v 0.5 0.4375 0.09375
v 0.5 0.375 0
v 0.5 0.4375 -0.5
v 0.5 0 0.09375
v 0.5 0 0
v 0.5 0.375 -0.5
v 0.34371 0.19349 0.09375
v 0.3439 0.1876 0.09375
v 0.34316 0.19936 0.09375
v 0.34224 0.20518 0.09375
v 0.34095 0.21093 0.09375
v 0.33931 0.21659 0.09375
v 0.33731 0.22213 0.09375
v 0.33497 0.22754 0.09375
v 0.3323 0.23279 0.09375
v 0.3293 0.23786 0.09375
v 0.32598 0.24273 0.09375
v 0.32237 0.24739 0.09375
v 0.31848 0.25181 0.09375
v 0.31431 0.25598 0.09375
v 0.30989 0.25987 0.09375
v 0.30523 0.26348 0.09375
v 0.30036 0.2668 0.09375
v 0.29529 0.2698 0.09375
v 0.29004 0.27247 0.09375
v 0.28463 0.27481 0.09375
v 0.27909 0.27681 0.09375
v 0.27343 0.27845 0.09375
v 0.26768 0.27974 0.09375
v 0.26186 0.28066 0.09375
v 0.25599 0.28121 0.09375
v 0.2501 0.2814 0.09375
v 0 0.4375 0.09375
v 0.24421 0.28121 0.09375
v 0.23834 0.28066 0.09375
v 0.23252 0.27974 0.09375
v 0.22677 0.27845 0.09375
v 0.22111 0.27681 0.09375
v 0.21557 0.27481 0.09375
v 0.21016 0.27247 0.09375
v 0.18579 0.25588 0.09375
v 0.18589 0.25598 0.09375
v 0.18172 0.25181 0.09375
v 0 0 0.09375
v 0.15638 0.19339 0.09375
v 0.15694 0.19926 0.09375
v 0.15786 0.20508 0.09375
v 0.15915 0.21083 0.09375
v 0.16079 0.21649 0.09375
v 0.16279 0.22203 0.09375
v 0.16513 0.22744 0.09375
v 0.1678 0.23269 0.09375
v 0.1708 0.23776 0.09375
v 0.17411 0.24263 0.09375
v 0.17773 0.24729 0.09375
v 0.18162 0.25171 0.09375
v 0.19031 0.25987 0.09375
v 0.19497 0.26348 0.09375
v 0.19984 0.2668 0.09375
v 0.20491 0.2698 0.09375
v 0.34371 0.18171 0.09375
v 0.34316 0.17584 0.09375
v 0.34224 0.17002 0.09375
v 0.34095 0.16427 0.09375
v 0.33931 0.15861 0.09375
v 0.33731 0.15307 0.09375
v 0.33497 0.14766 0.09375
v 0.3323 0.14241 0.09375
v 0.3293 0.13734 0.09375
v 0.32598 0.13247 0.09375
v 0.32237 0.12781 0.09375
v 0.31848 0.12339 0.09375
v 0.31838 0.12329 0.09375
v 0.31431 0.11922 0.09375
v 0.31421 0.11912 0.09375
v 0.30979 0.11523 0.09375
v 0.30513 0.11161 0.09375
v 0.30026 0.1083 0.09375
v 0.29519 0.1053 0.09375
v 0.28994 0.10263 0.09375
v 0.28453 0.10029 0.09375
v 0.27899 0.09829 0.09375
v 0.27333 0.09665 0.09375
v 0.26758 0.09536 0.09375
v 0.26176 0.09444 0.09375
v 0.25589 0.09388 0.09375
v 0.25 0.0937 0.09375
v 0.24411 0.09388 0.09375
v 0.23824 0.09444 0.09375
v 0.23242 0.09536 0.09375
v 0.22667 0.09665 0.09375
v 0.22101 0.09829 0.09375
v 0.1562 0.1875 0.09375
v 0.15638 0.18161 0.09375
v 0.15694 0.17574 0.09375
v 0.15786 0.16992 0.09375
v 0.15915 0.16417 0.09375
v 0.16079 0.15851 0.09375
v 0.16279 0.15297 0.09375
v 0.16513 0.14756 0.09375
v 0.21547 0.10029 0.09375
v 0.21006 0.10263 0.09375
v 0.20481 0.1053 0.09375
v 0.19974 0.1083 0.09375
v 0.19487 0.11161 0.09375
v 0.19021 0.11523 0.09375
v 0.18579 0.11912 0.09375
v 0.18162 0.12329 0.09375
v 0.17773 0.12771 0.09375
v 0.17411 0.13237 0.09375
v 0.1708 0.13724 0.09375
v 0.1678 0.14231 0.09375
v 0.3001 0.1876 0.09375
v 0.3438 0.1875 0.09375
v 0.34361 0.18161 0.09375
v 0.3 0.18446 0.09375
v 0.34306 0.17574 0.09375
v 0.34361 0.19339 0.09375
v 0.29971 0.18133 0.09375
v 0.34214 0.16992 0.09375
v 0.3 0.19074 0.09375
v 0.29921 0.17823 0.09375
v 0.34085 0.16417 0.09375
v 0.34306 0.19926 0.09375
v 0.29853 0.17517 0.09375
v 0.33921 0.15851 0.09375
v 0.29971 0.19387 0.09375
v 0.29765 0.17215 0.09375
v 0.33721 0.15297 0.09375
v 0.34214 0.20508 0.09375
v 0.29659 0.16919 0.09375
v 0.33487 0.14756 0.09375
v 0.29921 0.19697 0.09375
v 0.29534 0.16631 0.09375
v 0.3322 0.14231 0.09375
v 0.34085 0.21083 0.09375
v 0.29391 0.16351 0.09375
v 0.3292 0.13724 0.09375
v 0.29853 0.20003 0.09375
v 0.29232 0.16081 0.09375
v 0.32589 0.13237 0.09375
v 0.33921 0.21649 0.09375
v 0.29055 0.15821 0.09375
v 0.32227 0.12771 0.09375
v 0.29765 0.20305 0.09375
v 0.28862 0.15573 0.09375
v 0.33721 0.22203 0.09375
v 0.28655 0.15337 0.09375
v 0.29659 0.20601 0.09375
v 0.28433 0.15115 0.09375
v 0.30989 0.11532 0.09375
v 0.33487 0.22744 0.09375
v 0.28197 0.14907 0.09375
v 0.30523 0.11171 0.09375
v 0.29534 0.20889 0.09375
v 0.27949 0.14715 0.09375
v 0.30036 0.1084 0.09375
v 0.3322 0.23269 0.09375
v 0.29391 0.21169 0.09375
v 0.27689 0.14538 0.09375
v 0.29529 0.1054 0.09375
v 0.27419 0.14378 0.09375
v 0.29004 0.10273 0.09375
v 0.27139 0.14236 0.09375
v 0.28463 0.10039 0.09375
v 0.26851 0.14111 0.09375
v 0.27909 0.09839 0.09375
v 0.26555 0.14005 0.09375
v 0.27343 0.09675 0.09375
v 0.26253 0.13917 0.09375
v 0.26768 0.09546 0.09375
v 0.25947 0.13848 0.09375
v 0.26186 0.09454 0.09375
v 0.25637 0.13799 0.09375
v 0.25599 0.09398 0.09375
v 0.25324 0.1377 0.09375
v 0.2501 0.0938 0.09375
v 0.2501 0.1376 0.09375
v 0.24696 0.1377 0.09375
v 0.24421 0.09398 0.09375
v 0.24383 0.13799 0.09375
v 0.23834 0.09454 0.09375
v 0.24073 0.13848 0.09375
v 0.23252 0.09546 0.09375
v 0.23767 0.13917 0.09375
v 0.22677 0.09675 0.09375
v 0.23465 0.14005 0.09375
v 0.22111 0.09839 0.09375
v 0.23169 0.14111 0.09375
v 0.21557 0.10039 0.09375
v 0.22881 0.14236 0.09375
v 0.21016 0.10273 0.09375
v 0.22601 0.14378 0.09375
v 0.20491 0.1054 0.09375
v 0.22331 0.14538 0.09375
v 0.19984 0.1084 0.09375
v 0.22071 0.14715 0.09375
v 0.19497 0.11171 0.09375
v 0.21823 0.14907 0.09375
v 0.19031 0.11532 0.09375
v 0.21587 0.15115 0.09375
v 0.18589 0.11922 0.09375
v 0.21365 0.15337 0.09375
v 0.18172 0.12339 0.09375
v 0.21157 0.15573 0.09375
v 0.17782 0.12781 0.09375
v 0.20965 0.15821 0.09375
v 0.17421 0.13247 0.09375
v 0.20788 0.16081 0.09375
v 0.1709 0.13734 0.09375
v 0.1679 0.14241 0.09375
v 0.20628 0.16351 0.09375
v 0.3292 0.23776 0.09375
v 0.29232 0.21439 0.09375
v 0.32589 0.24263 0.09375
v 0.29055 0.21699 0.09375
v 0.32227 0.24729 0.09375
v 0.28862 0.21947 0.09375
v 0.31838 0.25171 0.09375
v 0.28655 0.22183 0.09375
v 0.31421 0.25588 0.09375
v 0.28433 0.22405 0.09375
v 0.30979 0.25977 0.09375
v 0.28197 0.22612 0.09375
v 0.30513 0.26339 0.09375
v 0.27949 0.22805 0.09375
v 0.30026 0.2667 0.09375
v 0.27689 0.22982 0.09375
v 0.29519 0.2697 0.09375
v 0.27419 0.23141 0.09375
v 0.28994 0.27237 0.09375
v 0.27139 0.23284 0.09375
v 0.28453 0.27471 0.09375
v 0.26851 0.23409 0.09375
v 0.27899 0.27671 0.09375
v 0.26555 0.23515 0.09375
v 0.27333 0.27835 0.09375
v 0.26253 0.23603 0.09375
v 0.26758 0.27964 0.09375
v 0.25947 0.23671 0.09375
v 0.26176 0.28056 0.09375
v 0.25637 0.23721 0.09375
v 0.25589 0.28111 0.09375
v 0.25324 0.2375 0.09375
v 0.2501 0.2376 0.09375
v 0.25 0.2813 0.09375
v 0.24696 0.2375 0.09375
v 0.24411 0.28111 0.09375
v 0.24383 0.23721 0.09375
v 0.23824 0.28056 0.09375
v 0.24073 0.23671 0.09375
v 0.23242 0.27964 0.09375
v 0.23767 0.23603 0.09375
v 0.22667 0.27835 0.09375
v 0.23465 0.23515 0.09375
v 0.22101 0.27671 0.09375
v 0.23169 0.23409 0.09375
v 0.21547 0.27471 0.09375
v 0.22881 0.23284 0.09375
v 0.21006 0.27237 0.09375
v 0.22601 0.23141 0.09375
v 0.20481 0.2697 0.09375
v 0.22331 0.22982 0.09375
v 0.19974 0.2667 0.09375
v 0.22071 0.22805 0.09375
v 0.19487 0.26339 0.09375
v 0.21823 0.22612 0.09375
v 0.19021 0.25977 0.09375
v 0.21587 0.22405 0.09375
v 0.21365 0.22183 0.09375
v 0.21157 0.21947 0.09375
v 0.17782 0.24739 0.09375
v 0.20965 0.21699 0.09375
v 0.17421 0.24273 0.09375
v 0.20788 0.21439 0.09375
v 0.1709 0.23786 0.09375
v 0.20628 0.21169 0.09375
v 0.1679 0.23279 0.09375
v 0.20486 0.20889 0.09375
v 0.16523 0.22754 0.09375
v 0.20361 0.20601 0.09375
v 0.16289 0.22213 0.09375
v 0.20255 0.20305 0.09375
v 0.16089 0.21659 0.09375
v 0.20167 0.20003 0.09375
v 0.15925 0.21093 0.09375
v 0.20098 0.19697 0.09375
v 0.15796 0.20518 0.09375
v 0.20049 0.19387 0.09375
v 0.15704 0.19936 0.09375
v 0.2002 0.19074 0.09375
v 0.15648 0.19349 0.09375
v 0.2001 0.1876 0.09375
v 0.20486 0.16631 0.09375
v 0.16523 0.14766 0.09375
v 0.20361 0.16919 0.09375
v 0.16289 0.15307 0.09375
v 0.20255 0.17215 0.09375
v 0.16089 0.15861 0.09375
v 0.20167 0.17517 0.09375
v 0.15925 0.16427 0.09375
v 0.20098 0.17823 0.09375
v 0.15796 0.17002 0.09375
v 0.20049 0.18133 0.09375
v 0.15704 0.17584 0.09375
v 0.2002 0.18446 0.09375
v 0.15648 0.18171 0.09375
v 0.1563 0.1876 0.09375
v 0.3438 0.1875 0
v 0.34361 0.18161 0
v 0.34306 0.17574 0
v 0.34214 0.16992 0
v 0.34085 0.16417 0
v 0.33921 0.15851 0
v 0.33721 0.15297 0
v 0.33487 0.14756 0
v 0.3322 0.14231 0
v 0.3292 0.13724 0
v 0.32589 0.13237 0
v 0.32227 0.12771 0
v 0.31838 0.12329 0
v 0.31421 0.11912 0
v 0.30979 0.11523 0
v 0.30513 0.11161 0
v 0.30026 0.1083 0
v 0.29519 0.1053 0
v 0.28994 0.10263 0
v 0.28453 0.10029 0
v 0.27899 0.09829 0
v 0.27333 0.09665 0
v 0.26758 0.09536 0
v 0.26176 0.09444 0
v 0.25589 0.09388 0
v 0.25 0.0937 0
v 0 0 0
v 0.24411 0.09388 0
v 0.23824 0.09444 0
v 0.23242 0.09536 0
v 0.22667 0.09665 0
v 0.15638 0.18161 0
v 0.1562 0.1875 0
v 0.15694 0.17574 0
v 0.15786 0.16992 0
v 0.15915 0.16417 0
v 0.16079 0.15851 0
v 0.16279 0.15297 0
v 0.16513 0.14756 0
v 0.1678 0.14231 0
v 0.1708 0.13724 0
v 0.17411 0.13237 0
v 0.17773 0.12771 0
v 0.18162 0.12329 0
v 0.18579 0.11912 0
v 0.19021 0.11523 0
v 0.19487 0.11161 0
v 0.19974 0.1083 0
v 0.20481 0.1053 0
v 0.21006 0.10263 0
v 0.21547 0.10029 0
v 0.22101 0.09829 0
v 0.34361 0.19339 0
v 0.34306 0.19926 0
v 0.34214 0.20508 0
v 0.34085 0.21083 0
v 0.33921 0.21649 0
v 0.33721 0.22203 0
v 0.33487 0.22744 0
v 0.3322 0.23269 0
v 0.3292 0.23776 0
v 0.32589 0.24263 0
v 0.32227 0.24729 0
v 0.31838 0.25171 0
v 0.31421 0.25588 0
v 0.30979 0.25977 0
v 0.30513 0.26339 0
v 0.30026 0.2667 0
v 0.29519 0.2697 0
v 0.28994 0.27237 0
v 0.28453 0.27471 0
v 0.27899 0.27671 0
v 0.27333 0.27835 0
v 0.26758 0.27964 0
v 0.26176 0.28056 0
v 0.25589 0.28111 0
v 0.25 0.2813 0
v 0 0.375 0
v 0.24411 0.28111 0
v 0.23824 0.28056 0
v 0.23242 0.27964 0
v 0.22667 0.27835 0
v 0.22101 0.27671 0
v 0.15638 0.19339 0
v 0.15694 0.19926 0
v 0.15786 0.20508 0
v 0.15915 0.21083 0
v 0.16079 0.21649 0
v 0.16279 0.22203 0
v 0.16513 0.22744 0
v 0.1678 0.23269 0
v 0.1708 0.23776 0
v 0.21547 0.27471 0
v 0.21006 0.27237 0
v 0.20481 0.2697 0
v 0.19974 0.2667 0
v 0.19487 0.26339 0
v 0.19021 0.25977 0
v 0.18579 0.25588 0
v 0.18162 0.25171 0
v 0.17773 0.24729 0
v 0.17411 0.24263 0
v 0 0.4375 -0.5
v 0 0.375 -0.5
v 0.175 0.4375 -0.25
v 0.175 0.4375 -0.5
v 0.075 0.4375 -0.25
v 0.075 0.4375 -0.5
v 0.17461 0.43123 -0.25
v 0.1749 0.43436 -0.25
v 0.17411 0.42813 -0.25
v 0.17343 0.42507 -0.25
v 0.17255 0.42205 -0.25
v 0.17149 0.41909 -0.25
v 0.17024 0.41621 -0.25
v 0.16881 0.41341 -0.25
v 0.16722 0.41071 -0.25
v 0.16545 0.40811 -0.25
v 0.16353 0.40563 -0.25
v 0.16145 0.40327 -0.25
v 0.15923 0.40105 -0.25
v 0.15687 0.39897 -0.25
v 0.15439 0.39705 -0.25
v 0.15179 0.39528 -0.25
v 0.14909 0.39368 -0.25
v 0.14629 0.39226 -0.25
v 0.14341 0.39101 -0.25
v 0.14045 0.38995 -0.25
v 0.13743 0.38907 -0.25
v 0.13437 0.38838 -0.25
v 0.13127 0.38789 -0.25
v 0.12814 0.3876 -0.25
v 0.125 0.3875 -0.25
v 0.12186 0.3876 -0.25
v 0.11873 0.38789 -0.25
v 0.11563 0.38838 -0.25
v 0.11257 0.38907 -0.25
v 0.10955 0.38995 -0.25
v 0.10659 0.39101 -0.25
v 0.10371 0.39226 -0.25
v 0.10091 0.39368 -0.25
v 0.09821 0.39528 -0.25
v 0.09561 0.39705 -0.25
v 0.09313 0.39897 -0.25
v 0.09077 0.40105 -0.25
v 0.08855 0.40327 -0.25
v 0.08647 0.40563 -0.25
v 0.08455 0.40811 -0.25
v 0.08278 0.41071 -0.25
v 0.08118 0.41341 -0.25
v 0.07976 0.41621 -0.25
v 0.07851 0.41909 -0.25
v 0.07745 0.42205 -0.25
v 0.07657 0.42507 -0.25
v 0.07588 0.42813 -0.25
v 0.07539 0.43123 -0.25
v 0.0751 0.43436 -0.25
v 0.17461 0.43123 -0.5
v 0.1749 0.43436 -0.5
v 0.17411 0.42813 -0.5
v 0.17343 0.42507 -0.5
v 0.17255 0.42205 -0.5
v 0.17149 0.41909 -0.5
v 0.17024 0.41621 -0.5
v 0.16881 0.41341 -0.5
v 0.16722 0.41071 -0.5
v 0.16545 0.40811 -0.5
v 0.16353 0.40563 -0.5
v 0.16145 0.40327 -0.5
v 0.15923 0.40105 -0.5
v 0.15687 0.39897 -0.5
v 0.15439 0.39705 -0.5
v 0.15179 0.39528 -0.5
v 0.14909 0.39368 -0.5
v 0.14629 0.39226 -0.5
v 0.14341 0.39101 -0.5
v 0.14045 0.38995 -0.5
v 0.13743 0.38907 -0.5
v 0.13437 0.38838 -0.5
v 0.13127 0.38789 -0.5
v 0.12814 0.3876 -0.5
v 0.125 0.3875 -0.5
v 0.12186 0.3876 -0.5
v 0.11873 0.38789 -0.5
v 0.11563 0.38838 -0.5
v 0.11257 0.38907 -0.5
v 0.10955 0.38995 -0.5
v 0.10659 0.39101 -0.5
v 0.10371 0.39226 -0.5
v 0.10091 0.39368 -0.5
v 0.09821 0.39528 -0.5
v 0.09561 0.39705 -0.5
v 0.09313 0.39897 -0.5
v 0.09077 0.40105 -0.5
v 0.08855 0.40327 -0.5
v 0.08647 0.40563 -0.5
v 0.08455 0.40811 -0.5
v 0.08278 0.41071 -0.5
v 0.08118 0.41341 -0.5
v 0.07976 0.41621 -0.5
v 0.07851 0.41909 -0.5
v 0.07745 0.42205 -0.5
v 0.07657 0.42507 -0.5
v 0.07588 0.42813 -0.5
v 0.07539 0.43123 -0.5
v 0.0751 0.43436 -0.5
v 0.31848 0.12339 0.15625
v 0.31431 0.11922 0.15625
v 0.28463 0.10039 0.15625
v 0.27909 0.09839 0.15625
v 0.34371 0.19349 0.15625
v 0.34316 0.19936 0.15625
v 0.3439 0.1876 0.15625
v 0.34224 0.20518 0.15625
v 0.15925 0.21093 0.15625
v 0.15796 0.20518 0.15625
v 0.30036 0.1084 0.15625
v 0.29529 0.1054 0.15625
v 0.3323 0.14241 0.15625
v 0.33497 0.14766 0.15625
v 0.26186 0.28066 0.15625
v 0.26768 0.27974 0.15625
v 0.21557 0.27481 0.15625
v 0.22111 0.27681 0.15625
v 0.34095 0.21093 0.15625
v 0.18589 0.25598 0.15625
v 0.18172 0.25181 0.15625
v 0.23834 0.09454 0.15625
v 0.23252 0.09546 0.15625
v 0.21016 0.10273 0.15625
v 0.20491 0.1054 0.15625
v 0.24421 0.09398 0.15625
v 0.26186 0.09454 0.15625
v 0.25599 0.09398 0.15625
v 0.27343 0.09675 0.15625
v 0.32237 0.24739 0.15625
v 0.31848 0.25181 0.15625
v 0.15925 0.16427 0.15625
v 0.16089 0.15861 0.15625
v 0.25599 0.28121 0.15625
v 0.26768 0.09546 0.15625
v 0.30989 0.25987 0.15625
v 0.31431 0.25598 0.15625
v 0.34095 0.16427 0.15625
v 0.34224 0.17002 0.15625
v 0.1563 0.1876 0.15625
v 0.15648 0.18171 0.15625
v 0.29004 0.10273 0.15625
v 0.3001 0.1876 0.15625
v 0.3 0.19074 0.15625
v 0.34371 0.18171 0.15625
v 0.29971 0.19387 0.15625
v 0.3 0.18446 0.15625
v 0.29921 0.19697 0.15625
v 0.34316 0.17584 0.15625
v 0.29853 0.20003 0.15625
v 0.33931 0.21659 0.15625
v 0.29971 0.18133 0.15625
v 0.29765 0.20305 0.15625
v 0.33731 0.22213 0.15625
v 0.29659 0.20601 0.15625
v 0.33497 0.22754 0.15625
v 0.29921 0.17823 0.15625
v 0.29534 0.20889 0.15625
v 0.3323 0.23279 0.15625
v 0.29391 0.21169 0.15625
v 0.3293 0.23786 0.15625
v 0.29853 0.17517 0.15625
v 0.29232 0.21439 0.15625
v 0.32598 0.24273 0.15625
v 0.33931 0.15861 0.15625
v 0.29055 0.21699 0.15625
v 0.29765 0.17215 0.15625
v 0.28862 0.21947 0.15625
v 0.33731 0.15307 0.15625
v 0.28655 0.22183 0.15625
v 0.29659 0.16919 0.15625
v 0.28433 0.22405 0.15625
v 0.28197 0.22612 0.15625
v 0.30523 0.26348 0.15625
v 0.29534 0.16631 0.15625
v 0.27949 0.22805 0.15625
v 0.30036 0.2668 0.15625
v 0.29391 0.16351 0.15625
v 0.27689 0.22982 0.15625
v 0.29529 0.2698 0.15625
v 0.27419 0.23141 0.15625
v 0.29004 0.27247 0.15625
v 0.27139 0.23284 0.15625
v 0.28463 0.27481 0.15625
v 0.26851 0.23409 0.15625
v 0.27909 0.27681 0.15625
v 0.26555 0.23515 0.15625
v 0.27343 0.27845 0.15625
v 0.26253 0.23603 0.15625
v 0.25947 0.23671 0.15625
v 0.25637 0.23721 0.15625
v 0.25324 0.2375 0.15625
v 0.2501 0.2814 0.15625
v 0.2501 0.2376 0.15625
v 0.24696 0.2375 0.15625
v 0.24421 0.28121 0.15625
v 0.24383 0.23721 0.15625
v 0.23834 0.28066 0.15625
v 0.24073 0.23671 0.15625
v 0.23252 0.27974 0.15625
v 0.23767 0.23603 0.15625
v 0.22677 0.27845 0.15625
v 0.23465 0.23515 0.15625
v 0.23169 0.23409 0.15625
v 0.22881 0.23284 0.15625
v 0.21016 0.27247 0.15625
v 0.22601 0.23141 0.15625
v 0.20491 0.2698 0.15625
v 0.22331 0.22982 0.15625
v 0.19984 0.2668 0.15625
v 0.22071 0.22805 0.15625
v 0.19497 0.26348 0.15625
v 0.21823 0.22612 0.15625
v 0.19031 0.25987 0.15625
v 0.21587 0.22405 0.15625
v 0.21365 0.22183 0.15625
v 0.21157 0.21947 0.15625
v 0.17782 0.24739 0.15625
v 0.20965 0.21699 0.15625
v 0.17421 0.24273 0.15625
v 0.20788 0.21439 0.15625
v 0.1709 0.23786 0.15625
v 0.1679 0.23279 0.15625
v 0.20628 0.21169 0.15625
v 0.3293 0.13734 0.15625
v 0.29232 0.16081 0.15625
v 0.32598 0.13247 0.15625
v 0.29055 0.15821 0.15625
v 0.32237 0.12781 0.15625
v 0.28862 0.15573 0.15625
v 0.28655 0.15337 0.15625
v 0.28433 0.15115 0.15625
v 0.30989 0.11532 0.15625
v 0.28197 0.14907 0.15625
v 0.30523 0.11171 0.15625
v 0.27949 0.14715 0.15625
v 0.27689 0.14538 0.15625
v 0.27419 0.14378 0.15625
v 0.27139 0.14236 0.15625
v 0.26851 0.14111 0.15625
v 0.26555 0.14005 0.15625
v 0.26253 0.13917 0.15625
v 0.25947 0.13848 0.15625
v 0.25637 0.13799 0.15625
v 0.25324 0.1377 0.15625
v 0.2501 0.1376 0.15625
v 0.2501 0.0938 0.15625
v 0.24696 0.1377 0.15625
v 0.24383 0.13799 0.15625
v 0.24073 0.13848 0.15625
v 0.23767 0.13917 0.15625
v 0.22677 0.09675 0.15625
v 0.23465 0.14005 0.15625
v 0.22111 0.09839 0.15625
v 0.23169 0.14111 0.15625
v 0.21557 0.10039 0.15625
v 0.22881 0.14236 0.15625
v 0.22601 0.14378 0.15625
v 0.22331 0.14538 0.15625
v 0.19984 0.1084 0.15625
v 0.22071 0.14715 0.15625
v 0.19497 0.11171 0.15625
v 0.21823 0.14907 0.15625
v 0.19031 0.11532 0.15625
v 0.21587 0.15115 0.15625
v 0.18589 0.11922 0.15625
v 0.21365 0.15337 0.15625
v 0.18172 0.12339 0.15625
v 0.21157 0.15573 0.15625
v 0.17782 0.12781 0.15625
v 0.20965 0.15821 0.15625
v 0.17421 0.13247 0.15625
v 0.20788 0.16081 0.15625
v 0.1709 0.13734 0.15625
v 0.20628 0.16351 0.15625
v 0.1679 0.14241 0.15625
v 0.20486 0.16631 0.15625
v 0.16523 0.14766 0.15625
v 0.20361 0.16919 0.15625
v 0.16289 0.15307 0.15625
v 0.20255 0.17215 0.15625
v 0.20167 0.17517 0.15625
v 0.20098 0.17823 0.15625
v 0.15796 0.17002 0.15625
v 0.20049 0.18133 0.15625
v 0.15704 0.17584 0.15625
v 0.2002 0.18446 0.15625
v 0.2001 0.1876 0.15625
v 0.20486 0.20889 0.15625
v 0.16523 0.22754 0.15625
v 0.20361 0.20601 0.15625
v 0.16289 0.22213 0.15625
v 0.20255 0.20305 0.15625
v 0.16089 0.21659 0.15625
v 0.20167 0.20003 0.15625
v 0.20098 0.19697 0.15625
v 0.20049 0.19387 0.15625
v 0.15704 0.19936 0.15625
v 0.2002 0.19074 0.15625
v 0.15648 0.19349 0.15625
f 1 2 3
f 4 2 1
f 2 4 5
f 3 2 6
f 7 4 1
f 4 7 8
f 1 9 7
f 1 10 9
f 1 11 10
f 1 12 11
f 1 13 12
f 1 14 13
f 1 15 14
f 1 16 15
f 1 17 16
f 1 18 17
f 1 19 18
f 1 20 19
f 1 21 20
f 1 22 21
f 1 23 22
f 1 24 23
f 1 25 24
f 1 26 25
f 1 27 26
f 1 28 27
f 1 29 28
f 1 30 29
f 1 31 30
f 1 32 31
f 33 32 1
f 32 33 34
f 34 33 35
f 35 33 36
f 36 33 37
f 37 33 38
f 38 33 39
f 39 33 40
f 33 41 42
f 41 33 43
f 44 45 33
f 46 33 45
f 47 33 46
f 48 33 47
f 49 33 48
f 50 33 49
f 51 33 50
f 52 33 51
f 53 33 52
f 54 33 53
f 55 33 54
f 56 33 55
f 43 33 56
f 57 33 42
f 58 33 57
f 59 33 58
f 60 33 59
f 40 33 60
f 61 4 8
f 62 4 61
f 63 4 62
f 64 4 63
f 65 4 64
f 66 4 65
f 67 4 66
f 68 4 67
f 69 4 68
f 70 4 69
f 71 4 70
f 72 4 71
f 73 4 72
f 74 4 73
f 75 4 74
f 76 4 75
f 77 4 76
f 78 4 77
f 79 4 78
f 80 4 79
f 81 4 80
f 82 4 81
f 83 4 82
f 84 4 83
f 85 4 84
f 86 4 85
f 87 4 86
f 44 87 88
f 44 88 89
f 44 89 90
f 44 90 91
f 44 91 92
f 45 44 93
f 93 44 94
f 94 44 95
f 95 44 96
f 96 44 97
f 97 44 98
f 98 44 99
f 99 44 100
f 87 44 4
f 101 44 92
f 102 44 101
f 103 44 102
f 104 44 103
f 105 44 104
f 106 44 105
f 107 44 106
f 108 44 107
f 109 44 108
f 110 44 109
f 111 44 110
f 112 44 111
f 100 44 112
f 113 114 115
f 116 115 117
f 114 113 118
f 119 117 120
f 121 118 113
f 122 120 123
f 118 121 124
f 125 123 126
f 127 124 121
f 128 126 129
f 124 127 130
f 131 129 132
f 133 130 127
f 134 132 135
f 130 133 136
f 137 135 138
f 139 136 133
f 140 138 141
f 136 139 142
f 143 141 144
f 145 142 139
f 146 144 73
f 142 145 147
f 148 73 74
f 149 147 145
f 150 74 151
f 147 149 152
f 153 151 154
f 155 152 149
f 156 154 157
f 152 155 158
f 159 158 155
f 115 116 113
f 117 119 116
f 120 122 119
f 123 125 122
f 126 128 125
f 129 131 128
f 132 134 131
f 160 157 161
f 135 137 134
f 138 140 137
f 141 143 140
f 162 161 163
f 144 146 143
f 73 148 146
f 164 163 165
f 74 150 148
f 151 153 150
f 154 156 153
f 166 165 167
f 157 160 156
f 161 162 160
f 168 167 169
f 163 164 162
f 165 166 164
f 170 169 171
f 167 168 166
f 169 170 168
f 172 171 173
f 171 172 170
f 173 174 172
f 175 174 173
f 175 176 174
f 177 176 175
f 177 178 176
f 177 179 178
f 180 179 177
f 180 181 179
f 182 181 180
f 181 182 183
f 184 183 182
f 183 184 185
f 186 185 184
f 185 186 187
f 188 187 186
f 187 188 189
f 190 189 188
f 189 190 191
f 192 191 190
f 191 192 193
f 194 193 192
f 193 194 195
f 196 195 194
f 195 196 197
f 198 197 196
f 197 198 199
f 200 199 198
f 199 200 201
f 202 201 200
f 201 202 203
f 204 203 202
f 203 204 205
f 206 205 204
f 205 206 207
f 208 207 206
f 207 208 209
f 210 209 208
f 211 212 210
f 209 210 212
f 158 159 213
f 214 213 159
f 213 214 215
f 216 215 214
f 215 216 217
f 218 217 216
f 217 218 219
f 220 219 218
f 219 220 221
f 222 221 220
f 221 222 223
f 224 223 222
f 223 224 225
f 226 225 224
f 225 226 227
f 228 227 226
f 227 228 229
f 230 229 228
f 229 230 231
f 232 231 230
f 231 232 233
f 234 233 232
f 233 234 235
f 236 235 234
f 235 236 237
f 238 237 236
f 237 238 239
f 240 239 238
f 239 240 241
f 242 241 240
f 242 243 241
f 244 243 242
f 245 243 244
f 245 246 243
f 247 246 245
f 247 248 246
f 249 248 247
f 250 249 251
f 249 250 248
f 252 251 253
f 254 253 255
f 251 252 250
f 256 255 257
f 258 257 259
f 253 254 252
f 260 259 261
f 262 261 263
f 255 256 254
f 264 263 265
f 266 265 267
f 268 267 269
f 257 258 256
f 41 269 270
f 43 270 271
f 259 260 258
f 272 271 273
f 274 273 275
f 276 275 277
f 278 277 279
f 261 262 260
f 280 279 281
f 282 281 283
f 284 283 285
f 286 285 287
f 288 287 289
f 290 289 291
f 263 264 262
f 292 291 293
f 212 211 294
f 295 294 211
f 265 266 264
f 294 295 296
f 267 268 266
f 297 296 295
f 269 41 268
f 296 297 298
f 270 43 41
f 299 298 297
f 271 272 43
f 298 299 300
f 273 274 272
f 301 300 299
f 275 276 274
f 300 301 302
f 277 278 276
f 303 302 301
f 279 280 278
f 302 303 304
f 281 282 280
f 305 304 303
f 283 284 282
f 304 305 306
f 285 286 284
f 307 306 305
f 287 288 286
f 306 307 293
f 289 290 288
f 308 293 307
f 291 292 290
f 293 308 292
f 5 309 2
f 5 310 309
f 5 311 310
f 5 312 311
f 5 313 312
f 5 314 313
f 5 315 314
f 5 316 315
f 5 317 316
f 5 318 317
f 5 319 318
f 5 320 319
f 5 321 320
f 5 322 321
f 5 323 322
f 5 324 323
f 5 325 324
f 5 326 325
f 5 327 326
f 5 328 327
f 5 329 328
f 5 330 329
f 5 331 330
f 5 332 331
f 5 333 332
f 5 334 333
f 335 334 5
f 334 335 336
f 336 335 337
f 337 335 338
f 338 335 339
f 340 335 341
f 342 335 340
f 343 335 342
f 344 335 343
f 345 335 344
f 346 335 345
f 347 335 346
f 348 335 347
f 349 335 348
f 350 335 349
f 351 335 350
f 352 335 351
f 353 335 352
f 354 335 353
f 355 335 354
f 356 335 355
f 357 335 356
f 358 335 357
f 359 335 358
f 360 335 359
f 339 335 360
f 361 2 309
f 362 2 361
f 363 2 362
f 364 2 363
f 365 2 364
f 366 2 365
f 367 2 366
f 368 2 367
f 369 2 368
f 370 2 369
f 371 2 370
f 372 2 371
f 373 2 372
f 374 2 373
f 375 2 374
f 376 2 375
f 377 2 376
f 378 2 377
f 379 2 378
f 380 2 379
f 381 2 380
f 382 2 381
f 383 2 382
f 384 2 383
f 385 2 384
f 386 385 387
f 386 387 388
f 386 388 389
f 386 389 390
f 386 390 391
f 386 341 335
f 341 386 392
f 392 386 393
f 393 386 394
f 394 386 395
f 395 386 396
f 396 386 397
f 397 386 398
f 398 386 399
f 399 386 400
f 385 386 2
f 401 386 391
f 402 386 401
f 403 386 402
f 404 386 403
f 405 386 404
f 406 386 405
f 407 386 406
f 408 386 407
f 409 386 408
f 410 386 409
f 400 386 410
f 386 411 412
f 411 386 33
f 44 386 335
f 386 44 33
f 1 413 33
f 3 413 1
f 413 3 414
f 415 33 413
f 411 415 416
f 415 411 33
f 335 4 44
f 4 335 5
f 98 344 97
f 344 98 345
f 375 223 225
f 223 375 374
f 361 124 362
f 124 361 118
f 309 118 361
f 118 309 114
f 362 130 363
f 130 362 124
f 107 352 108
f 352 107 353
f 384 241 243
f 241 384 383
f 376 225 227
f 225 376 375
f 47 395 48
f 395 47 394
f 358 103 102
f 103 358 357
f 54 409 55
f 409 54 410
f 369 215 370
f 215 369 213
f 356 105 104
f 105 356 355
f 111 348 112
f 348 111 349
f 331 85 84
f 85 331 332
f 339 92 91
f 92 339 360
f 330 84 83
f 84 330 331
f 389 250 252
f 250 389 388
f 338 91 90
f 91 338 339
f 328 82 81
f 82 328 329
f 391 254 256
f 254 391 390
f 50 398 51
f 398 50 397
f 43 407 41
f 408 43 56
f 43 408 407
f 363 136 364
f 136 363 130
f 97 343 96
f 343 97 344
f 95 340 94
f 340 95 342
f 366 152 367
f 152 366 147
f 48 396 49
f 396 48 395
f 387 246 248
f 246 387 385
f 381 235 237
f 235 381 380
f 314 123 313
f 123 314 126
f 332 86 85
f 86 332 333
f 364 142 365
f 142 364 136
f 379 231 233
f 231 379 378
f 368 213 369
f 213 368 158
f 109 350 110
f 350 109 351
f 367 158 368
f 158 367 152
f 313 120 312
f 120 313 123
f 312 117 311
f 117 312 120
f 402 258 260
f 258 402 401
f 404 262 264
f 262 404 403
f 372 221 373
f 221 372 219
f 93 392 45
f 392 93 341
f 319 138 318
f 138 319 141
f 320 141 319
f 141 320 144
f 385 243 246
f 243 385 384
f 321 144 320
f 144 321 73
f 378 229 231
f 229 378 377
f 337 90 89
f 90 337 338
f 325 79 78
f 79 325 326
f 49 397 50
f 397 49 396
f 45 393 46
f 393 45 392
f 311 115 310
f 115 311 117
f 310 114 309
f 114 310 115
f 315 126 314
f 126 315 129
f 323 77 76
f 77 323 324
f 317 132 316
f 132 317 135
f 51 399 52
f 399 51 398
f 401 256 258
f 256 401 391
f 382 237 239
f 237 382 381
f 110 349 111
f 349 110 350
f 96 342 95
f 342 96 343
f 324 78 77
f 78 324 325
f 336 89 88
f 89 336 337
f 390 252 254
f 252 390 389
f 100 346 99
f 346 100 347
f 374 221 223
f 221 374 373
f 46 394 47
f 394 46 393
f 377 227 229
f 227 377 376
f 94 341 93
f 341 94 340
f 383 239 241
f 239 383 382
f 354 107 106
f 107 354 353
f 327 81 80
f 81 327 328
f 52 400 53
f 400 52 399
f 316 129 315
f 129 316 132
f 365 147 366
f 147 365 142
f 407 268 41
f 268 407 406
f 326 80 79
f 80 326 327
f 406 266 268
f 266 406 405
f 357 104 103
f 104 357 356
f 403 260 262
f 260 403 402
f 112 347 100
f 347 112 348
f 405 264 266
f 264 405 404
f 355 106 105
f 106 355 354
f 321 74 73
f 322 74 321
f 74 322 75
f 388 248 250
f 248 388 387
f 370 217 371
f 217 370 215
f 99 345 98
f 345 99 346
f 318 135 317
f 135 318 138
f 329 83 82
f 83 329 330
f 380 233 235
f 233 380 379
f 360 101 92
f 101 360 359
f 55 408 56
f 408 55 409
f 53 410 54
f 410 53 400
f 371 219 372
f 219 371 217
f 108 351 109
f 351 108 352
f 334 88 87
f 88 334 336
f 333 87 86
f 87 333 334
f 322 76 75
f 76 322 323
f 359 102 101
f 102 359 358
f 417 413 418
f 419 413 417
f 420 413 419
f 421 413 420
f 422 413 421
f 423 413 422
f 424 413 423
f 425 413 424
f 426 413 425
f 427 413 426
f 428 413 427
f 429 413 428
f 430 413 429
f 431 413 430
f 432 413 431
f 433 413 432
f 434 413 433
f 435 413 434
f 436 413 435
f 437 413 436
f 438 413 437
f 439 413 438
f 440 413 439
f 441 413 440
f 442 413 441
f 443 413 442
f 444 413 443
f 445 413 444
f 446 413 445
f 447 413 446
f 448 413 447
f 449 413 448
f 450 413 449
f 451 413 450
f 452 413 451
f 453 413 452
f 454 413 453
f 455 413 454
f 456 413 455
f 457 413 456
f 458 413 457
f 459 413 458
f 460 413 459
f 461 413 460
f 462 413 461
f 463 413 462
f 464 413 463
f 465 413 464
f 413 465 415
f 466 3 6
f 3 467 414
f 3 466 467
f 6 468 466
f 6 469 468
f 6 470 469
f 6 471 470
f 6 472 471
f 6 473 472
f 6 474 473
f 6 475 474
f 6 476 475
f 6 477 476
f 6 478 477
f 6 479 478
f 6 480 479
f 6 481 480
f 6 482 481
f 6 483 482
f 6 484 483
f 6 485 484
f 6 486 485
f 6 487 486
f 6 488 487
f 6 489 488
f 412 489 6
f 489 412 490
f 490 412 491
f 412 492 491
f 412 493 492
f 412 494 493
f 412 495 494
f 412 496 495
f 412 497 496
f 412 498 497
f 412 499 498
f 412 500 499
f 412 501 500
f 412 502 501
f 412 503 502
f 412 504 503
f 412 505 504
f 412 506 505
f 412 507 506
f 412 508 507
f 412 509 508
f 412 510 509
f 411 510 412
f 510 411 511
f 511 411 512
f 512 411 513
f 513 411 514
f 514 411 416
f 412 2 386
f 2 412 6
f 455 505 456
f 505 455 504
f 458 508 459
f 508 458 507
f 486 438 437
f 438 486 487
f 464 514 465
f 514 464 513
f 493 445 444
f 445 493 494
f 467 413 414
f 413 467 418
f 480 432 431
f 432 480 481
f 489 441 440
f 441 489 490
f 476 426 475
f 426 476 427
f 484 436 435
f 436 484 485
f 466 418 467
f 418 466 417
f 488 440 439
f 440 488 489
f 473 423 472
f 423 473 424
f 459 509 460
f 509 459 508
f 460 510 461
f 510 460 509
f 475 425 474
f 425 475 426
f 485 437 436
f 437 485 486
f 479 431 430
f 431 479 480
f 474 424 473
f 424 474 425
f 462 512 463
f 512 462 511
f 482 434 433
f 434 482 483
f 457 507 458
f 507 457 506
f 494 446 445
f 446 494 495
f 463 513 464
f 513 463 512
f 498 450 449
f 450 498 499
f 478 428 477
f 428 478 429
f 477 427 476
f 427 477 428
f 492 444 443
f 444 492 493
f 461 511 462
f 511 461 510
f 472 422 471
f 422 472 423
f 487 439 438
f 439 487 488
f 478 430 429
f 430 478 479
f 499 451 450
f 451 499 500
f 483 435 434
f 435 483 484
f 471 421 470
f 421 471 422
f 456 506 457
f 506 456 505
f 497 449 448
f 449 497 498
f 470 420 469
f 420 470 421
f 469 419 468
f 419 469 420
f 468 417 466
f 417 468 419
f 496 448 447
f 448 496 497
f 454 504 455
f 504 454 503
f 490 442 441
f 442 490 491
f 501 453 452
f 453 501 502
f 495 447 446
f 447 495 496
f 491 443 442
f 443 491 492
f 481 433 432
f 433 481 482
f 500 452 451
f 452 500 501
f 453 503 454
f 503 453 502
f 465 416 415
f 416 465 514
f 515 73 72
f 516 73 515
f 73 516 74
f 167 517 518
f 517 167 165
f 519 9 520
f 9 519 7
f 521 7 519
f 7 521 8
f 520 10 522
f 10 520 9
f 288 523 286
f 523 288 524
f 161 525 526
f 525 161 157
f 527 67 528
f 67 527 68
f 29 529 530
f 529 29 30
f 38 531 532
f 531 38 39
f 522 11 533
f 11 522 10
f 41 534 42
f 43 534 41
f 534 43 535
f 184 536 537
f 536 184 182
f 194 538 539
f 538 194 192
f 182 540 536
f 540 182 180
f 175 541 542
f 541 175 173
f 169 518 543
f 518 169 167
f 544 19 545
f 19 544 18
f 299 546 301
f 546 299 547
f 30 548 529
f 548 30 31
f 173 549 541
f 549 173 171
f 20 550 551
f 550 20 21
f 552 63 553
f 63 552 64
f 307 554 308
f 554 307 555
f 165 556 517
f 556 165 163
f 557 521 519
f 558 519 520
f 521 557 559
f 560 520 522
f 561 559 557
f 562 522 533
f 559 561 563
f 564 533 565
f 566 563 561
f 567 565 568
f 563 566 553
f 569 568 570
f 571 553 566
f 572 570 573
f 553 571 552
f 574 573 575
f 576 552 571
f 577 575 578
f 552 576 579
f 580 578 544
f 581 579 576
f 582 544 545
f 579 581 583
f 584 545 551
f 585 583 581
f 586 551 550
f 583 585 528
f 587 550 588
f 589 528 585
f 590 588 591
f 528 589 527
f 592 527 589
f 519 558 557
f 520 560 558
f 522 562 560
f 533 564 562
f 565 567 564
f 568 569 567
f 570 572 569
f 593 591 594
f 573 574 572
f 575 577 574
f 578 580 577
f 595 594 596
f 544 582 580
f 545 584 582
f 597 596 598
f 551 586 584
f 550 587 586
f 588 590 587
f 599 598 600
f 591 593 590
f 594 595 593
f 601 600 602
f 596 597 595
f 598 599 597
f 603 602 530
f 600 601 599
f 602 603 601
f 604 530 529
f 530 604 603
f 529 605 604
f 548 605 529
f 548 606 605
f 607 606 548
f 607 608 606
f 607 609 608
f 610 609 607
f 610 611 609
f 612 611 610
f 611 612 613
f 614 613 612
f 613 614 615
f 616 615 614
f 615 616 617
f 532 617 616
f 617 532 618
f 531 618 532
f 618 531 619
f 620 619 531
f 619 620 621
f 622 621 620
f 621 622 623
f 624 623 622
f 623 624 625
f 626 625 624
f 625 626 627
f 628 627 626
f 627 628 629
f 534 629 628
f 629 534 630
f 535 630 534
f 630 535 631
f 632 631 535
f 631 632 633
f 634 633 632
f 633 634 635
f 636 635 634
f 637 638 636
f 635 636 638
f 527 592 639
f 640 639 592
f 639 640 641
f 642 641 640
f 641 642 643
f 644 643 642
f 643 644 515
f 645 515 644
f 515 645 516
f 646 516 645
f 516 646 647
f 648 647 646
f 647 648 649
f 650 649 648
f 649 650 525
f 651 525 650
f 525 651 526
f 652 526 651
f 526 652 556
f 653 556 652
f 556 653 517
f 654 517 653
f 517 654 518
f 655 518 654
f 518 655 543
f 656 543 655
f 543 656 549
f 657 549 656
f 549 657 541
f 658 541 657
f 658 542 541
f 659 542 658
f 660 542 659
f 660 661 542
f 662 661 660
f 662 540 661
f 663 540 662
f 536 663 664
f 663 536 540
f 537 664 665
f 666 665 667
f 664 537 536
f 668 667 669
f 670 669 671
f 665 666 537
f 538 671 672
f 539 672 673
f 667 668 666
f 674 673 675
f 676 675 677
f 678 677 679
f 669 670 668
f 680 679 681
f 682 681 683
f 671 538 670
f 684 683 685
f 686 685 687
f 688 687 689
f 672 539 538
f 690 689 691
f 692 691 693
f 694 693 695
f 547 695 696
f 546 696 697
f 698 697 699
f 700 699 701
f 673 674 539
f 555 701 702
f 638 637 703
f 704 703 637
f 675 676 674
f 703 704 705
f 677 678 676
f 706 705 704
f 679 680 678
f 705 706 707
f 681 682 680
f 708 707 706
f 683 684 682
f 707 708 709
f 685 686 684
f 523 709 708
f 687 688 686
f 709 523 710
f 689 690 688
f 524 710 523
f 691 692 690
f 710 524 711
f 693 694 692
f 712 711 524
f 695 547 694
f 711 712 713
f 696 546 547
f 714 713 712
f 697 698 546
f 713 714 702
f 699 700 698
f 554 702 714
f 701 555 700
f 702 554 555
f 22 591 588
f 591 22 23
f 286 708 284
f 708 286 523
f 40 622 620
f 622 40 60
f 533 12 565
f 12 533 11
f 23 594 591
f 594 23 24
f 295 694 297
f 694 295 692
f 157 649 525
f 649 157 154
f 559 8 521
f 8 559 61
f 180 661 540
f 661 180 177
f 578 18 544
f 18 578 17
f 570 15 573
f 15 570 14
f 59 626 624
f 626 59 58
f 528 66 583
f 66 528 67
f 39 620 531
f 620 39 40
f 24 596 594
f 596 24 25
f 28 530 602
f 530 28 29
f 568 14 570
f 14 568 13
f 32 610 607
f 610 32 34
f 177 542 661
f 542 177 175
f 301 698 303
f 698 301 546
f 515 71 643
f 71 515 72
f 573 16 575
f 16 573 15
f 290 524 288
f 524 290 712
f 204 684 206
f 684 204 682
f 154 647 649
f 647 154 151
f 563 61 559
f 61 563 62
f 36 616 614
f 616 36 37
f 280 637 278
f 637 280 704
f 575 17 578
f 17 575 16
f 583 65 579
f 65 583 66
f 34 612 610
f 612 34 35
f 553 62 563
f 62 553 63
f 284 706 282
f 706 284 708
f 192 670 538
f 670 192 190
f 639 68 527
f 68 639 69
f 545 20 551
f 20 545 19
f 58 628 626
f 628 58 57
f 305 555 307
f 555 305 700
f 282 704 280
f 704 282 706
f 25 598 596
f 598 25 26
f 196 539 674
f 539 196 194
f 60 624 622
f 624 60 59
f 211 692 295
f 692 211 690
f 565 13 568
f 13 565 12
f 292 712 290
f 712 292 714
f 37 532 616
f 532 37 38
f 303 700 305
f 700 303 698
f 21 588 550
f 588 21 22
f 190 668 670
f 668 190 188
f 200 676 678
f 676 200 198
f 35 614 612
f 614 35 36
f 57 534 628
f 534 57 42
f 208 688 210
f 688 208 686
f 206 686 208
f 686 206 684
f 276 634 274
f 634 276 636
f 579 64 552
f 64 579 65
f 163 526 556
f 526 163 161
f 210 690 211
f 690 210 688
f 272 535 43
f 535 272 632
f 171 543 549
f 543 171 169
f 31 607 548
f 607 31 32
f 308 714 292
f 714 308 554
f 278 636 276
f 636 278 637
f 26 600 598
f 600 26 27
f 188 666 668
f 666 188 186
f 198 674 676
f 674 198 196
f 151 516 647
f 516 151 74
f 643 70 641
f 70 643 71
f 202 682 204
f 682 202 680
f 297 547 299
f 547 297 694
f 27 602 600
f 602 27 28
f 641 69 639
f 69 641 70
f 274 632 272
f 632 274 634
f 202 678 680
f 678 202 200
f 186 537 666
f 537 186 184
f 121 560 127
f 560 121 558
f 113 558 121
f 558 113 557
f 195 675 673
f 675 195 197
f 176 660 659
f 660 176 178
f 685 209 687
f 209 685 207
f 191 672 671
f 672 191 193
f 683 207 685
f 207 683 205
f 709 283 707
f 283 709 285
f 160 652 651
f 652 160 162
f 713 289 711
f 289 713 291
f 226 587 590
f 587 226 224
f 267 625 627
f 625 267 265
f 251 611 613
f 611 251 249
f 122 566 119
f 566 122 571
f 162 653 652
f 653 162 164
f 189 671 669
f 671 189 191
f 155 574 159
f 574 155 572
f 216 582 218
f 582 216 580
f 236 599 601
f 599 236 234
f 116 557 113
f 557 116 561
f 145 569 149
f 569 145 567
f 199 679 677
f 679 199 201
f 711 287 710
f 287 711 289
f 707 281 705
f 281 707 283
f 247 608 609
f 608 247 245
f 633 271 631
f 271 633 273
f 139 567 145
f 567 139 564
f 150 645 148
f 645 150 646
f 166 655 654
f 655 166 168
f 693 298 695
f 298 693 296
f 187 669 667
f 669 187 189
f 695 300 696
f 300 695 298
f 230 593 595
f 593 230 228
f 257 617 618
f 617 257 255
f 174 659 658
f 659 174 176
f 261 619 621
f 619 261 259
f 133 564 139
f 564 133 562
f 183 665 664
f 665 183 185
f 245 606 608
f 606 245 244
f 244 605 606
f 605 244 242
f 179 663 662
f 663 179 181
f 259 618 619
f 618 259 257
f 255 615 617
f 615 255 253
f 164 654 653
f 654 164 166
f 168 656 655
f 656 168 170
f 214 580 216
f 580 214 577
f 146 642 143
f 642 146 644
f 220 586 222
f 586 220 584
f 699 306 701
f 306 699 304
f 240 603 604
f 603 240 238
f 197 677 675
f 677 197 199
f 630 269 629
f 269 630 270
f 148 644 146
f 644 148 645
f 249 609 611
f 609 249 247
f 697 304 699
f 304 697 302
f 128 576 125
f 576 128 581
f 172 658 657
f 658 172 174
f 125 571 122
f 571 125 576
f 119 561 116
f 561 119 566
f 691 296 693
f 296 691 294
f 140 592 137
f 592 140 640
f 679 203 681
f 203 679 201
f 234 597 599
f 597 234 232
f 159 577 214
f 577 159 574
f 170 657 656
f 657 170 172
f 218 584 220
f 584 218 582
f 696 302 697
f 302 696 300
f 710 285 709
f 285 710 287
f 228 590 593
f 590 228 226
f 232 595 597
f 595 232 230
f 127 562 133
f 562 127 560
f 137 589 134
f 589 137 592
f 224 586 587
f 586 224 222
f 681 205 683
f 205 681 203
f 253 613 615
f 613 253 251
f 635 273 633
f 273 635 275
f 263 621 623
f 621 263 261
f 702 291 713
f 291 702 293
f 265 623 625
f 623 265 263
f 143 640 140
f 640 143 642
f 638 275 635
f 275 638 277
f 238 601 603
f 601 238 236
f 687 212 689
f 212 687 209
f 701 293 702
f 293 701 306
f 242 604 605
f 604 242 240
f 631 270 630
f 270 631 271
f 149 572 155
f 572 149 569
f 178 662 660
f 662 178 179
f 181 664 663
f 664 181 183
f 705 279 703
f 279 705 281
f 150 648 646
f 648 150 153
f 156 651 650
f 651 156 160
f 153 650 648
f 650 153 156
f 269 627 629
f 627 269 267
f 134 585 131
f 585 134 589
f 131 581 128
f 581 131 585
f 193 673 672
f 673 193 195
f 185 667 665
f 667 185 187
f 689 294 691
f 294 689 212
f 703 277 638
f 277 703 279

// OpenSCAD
// === Parameters ===

// Main rectangular base
base_length    = 0.5;       // X dimension
base_width     = 0.4375;    // Y dimension
base_height    = 0.09375;   // Z dimension (upward from z=0)

// Circular void through the base
base_hole_x    = 0.25;      // Center from left edge
base_hole_y    = 0.1875;    // Center from front edge
base_hole_r    = 0.0938;    // Radius

// Back-edge strip common footprint
strip_length   = 0.5;       // X span (full length)
strip_depth    = 0.0625;    // Y span
strip_y_front  = 0.375;     // Y offset of strip front face

// Strip 1 (upper leg): base underside to 0.25 below
strip1_height  = 0.25;

// Strip 2 (lower leg): 0.25 below to 0.50 below base underside
strip2_height  = 0.25;

// Circular void in strip 2
strip_hole_x   = 0.125;     // Center from left edge
strip_hole_y   = 0.4375;    // Center from front edge
strip_hole_r   = 0.05;      // Radius

// Annular collar on top of base
collar_x       = 0.2501;    // Center from left edge
collar_y       = 0.1876;    // Center from front edge
collar_outer_r = 0.0938;    // Outer radius
collar_inner_r = 0.05;      // Inner radius (void)
collar_height  = 0.0625;    // Height above base top

$fn = 100;

// === Helper Modules ===

// Annular collar (tube)
module annular_collar(cx, cy, z0, h, r_out, r_in) {
    difference() {
        translate([cx, cy, z0])
            cylinder(h = h, r = r_out);
        translate([cx, cy, z0 - 0.01])
            cylinder(h = h + 0.02, r = r_in);
    }
}

// === Main Assembly ===
union() {

    // 1) Main rectangular base with circular void
    difference() {
        cube([base_length, base_width, base_height]);

        // Through-hole in the base
        translate([base_hole_x, base_hole_y, -0.01])
            cylinder(h = base_height + 0.02, r = base_hole_r);
    }

    // 2) Upper back-edge strip (hangs below base, z = -strip1_height to 0)
    translate([0, strip_y_front, -strip1_height])
        cube([strip_length, strip_depth, strip1_height]);

    // 3) Lower back-edge strip with circular void holes
    difference() {
        translate([0, strip_y_front, -(strip1_height + strip2_height)])
            cube([strip_length, strip_depth, strip2_height]);

        // Vertical circular void through strip 2
        translate([strip_hole_x, strip_hole_y,
                   -(strip1_height + strip2_height) - 0.01])
            cylinder(h = strip2_height + 0.02, r = strip_hole_r);
    }

    // 4) Concentric annular collar on top of base
    annular_collar(collar_x, collar_y,
                   base_height, collar_height,
                   collar_outer_r, collar_inner_r);
}
